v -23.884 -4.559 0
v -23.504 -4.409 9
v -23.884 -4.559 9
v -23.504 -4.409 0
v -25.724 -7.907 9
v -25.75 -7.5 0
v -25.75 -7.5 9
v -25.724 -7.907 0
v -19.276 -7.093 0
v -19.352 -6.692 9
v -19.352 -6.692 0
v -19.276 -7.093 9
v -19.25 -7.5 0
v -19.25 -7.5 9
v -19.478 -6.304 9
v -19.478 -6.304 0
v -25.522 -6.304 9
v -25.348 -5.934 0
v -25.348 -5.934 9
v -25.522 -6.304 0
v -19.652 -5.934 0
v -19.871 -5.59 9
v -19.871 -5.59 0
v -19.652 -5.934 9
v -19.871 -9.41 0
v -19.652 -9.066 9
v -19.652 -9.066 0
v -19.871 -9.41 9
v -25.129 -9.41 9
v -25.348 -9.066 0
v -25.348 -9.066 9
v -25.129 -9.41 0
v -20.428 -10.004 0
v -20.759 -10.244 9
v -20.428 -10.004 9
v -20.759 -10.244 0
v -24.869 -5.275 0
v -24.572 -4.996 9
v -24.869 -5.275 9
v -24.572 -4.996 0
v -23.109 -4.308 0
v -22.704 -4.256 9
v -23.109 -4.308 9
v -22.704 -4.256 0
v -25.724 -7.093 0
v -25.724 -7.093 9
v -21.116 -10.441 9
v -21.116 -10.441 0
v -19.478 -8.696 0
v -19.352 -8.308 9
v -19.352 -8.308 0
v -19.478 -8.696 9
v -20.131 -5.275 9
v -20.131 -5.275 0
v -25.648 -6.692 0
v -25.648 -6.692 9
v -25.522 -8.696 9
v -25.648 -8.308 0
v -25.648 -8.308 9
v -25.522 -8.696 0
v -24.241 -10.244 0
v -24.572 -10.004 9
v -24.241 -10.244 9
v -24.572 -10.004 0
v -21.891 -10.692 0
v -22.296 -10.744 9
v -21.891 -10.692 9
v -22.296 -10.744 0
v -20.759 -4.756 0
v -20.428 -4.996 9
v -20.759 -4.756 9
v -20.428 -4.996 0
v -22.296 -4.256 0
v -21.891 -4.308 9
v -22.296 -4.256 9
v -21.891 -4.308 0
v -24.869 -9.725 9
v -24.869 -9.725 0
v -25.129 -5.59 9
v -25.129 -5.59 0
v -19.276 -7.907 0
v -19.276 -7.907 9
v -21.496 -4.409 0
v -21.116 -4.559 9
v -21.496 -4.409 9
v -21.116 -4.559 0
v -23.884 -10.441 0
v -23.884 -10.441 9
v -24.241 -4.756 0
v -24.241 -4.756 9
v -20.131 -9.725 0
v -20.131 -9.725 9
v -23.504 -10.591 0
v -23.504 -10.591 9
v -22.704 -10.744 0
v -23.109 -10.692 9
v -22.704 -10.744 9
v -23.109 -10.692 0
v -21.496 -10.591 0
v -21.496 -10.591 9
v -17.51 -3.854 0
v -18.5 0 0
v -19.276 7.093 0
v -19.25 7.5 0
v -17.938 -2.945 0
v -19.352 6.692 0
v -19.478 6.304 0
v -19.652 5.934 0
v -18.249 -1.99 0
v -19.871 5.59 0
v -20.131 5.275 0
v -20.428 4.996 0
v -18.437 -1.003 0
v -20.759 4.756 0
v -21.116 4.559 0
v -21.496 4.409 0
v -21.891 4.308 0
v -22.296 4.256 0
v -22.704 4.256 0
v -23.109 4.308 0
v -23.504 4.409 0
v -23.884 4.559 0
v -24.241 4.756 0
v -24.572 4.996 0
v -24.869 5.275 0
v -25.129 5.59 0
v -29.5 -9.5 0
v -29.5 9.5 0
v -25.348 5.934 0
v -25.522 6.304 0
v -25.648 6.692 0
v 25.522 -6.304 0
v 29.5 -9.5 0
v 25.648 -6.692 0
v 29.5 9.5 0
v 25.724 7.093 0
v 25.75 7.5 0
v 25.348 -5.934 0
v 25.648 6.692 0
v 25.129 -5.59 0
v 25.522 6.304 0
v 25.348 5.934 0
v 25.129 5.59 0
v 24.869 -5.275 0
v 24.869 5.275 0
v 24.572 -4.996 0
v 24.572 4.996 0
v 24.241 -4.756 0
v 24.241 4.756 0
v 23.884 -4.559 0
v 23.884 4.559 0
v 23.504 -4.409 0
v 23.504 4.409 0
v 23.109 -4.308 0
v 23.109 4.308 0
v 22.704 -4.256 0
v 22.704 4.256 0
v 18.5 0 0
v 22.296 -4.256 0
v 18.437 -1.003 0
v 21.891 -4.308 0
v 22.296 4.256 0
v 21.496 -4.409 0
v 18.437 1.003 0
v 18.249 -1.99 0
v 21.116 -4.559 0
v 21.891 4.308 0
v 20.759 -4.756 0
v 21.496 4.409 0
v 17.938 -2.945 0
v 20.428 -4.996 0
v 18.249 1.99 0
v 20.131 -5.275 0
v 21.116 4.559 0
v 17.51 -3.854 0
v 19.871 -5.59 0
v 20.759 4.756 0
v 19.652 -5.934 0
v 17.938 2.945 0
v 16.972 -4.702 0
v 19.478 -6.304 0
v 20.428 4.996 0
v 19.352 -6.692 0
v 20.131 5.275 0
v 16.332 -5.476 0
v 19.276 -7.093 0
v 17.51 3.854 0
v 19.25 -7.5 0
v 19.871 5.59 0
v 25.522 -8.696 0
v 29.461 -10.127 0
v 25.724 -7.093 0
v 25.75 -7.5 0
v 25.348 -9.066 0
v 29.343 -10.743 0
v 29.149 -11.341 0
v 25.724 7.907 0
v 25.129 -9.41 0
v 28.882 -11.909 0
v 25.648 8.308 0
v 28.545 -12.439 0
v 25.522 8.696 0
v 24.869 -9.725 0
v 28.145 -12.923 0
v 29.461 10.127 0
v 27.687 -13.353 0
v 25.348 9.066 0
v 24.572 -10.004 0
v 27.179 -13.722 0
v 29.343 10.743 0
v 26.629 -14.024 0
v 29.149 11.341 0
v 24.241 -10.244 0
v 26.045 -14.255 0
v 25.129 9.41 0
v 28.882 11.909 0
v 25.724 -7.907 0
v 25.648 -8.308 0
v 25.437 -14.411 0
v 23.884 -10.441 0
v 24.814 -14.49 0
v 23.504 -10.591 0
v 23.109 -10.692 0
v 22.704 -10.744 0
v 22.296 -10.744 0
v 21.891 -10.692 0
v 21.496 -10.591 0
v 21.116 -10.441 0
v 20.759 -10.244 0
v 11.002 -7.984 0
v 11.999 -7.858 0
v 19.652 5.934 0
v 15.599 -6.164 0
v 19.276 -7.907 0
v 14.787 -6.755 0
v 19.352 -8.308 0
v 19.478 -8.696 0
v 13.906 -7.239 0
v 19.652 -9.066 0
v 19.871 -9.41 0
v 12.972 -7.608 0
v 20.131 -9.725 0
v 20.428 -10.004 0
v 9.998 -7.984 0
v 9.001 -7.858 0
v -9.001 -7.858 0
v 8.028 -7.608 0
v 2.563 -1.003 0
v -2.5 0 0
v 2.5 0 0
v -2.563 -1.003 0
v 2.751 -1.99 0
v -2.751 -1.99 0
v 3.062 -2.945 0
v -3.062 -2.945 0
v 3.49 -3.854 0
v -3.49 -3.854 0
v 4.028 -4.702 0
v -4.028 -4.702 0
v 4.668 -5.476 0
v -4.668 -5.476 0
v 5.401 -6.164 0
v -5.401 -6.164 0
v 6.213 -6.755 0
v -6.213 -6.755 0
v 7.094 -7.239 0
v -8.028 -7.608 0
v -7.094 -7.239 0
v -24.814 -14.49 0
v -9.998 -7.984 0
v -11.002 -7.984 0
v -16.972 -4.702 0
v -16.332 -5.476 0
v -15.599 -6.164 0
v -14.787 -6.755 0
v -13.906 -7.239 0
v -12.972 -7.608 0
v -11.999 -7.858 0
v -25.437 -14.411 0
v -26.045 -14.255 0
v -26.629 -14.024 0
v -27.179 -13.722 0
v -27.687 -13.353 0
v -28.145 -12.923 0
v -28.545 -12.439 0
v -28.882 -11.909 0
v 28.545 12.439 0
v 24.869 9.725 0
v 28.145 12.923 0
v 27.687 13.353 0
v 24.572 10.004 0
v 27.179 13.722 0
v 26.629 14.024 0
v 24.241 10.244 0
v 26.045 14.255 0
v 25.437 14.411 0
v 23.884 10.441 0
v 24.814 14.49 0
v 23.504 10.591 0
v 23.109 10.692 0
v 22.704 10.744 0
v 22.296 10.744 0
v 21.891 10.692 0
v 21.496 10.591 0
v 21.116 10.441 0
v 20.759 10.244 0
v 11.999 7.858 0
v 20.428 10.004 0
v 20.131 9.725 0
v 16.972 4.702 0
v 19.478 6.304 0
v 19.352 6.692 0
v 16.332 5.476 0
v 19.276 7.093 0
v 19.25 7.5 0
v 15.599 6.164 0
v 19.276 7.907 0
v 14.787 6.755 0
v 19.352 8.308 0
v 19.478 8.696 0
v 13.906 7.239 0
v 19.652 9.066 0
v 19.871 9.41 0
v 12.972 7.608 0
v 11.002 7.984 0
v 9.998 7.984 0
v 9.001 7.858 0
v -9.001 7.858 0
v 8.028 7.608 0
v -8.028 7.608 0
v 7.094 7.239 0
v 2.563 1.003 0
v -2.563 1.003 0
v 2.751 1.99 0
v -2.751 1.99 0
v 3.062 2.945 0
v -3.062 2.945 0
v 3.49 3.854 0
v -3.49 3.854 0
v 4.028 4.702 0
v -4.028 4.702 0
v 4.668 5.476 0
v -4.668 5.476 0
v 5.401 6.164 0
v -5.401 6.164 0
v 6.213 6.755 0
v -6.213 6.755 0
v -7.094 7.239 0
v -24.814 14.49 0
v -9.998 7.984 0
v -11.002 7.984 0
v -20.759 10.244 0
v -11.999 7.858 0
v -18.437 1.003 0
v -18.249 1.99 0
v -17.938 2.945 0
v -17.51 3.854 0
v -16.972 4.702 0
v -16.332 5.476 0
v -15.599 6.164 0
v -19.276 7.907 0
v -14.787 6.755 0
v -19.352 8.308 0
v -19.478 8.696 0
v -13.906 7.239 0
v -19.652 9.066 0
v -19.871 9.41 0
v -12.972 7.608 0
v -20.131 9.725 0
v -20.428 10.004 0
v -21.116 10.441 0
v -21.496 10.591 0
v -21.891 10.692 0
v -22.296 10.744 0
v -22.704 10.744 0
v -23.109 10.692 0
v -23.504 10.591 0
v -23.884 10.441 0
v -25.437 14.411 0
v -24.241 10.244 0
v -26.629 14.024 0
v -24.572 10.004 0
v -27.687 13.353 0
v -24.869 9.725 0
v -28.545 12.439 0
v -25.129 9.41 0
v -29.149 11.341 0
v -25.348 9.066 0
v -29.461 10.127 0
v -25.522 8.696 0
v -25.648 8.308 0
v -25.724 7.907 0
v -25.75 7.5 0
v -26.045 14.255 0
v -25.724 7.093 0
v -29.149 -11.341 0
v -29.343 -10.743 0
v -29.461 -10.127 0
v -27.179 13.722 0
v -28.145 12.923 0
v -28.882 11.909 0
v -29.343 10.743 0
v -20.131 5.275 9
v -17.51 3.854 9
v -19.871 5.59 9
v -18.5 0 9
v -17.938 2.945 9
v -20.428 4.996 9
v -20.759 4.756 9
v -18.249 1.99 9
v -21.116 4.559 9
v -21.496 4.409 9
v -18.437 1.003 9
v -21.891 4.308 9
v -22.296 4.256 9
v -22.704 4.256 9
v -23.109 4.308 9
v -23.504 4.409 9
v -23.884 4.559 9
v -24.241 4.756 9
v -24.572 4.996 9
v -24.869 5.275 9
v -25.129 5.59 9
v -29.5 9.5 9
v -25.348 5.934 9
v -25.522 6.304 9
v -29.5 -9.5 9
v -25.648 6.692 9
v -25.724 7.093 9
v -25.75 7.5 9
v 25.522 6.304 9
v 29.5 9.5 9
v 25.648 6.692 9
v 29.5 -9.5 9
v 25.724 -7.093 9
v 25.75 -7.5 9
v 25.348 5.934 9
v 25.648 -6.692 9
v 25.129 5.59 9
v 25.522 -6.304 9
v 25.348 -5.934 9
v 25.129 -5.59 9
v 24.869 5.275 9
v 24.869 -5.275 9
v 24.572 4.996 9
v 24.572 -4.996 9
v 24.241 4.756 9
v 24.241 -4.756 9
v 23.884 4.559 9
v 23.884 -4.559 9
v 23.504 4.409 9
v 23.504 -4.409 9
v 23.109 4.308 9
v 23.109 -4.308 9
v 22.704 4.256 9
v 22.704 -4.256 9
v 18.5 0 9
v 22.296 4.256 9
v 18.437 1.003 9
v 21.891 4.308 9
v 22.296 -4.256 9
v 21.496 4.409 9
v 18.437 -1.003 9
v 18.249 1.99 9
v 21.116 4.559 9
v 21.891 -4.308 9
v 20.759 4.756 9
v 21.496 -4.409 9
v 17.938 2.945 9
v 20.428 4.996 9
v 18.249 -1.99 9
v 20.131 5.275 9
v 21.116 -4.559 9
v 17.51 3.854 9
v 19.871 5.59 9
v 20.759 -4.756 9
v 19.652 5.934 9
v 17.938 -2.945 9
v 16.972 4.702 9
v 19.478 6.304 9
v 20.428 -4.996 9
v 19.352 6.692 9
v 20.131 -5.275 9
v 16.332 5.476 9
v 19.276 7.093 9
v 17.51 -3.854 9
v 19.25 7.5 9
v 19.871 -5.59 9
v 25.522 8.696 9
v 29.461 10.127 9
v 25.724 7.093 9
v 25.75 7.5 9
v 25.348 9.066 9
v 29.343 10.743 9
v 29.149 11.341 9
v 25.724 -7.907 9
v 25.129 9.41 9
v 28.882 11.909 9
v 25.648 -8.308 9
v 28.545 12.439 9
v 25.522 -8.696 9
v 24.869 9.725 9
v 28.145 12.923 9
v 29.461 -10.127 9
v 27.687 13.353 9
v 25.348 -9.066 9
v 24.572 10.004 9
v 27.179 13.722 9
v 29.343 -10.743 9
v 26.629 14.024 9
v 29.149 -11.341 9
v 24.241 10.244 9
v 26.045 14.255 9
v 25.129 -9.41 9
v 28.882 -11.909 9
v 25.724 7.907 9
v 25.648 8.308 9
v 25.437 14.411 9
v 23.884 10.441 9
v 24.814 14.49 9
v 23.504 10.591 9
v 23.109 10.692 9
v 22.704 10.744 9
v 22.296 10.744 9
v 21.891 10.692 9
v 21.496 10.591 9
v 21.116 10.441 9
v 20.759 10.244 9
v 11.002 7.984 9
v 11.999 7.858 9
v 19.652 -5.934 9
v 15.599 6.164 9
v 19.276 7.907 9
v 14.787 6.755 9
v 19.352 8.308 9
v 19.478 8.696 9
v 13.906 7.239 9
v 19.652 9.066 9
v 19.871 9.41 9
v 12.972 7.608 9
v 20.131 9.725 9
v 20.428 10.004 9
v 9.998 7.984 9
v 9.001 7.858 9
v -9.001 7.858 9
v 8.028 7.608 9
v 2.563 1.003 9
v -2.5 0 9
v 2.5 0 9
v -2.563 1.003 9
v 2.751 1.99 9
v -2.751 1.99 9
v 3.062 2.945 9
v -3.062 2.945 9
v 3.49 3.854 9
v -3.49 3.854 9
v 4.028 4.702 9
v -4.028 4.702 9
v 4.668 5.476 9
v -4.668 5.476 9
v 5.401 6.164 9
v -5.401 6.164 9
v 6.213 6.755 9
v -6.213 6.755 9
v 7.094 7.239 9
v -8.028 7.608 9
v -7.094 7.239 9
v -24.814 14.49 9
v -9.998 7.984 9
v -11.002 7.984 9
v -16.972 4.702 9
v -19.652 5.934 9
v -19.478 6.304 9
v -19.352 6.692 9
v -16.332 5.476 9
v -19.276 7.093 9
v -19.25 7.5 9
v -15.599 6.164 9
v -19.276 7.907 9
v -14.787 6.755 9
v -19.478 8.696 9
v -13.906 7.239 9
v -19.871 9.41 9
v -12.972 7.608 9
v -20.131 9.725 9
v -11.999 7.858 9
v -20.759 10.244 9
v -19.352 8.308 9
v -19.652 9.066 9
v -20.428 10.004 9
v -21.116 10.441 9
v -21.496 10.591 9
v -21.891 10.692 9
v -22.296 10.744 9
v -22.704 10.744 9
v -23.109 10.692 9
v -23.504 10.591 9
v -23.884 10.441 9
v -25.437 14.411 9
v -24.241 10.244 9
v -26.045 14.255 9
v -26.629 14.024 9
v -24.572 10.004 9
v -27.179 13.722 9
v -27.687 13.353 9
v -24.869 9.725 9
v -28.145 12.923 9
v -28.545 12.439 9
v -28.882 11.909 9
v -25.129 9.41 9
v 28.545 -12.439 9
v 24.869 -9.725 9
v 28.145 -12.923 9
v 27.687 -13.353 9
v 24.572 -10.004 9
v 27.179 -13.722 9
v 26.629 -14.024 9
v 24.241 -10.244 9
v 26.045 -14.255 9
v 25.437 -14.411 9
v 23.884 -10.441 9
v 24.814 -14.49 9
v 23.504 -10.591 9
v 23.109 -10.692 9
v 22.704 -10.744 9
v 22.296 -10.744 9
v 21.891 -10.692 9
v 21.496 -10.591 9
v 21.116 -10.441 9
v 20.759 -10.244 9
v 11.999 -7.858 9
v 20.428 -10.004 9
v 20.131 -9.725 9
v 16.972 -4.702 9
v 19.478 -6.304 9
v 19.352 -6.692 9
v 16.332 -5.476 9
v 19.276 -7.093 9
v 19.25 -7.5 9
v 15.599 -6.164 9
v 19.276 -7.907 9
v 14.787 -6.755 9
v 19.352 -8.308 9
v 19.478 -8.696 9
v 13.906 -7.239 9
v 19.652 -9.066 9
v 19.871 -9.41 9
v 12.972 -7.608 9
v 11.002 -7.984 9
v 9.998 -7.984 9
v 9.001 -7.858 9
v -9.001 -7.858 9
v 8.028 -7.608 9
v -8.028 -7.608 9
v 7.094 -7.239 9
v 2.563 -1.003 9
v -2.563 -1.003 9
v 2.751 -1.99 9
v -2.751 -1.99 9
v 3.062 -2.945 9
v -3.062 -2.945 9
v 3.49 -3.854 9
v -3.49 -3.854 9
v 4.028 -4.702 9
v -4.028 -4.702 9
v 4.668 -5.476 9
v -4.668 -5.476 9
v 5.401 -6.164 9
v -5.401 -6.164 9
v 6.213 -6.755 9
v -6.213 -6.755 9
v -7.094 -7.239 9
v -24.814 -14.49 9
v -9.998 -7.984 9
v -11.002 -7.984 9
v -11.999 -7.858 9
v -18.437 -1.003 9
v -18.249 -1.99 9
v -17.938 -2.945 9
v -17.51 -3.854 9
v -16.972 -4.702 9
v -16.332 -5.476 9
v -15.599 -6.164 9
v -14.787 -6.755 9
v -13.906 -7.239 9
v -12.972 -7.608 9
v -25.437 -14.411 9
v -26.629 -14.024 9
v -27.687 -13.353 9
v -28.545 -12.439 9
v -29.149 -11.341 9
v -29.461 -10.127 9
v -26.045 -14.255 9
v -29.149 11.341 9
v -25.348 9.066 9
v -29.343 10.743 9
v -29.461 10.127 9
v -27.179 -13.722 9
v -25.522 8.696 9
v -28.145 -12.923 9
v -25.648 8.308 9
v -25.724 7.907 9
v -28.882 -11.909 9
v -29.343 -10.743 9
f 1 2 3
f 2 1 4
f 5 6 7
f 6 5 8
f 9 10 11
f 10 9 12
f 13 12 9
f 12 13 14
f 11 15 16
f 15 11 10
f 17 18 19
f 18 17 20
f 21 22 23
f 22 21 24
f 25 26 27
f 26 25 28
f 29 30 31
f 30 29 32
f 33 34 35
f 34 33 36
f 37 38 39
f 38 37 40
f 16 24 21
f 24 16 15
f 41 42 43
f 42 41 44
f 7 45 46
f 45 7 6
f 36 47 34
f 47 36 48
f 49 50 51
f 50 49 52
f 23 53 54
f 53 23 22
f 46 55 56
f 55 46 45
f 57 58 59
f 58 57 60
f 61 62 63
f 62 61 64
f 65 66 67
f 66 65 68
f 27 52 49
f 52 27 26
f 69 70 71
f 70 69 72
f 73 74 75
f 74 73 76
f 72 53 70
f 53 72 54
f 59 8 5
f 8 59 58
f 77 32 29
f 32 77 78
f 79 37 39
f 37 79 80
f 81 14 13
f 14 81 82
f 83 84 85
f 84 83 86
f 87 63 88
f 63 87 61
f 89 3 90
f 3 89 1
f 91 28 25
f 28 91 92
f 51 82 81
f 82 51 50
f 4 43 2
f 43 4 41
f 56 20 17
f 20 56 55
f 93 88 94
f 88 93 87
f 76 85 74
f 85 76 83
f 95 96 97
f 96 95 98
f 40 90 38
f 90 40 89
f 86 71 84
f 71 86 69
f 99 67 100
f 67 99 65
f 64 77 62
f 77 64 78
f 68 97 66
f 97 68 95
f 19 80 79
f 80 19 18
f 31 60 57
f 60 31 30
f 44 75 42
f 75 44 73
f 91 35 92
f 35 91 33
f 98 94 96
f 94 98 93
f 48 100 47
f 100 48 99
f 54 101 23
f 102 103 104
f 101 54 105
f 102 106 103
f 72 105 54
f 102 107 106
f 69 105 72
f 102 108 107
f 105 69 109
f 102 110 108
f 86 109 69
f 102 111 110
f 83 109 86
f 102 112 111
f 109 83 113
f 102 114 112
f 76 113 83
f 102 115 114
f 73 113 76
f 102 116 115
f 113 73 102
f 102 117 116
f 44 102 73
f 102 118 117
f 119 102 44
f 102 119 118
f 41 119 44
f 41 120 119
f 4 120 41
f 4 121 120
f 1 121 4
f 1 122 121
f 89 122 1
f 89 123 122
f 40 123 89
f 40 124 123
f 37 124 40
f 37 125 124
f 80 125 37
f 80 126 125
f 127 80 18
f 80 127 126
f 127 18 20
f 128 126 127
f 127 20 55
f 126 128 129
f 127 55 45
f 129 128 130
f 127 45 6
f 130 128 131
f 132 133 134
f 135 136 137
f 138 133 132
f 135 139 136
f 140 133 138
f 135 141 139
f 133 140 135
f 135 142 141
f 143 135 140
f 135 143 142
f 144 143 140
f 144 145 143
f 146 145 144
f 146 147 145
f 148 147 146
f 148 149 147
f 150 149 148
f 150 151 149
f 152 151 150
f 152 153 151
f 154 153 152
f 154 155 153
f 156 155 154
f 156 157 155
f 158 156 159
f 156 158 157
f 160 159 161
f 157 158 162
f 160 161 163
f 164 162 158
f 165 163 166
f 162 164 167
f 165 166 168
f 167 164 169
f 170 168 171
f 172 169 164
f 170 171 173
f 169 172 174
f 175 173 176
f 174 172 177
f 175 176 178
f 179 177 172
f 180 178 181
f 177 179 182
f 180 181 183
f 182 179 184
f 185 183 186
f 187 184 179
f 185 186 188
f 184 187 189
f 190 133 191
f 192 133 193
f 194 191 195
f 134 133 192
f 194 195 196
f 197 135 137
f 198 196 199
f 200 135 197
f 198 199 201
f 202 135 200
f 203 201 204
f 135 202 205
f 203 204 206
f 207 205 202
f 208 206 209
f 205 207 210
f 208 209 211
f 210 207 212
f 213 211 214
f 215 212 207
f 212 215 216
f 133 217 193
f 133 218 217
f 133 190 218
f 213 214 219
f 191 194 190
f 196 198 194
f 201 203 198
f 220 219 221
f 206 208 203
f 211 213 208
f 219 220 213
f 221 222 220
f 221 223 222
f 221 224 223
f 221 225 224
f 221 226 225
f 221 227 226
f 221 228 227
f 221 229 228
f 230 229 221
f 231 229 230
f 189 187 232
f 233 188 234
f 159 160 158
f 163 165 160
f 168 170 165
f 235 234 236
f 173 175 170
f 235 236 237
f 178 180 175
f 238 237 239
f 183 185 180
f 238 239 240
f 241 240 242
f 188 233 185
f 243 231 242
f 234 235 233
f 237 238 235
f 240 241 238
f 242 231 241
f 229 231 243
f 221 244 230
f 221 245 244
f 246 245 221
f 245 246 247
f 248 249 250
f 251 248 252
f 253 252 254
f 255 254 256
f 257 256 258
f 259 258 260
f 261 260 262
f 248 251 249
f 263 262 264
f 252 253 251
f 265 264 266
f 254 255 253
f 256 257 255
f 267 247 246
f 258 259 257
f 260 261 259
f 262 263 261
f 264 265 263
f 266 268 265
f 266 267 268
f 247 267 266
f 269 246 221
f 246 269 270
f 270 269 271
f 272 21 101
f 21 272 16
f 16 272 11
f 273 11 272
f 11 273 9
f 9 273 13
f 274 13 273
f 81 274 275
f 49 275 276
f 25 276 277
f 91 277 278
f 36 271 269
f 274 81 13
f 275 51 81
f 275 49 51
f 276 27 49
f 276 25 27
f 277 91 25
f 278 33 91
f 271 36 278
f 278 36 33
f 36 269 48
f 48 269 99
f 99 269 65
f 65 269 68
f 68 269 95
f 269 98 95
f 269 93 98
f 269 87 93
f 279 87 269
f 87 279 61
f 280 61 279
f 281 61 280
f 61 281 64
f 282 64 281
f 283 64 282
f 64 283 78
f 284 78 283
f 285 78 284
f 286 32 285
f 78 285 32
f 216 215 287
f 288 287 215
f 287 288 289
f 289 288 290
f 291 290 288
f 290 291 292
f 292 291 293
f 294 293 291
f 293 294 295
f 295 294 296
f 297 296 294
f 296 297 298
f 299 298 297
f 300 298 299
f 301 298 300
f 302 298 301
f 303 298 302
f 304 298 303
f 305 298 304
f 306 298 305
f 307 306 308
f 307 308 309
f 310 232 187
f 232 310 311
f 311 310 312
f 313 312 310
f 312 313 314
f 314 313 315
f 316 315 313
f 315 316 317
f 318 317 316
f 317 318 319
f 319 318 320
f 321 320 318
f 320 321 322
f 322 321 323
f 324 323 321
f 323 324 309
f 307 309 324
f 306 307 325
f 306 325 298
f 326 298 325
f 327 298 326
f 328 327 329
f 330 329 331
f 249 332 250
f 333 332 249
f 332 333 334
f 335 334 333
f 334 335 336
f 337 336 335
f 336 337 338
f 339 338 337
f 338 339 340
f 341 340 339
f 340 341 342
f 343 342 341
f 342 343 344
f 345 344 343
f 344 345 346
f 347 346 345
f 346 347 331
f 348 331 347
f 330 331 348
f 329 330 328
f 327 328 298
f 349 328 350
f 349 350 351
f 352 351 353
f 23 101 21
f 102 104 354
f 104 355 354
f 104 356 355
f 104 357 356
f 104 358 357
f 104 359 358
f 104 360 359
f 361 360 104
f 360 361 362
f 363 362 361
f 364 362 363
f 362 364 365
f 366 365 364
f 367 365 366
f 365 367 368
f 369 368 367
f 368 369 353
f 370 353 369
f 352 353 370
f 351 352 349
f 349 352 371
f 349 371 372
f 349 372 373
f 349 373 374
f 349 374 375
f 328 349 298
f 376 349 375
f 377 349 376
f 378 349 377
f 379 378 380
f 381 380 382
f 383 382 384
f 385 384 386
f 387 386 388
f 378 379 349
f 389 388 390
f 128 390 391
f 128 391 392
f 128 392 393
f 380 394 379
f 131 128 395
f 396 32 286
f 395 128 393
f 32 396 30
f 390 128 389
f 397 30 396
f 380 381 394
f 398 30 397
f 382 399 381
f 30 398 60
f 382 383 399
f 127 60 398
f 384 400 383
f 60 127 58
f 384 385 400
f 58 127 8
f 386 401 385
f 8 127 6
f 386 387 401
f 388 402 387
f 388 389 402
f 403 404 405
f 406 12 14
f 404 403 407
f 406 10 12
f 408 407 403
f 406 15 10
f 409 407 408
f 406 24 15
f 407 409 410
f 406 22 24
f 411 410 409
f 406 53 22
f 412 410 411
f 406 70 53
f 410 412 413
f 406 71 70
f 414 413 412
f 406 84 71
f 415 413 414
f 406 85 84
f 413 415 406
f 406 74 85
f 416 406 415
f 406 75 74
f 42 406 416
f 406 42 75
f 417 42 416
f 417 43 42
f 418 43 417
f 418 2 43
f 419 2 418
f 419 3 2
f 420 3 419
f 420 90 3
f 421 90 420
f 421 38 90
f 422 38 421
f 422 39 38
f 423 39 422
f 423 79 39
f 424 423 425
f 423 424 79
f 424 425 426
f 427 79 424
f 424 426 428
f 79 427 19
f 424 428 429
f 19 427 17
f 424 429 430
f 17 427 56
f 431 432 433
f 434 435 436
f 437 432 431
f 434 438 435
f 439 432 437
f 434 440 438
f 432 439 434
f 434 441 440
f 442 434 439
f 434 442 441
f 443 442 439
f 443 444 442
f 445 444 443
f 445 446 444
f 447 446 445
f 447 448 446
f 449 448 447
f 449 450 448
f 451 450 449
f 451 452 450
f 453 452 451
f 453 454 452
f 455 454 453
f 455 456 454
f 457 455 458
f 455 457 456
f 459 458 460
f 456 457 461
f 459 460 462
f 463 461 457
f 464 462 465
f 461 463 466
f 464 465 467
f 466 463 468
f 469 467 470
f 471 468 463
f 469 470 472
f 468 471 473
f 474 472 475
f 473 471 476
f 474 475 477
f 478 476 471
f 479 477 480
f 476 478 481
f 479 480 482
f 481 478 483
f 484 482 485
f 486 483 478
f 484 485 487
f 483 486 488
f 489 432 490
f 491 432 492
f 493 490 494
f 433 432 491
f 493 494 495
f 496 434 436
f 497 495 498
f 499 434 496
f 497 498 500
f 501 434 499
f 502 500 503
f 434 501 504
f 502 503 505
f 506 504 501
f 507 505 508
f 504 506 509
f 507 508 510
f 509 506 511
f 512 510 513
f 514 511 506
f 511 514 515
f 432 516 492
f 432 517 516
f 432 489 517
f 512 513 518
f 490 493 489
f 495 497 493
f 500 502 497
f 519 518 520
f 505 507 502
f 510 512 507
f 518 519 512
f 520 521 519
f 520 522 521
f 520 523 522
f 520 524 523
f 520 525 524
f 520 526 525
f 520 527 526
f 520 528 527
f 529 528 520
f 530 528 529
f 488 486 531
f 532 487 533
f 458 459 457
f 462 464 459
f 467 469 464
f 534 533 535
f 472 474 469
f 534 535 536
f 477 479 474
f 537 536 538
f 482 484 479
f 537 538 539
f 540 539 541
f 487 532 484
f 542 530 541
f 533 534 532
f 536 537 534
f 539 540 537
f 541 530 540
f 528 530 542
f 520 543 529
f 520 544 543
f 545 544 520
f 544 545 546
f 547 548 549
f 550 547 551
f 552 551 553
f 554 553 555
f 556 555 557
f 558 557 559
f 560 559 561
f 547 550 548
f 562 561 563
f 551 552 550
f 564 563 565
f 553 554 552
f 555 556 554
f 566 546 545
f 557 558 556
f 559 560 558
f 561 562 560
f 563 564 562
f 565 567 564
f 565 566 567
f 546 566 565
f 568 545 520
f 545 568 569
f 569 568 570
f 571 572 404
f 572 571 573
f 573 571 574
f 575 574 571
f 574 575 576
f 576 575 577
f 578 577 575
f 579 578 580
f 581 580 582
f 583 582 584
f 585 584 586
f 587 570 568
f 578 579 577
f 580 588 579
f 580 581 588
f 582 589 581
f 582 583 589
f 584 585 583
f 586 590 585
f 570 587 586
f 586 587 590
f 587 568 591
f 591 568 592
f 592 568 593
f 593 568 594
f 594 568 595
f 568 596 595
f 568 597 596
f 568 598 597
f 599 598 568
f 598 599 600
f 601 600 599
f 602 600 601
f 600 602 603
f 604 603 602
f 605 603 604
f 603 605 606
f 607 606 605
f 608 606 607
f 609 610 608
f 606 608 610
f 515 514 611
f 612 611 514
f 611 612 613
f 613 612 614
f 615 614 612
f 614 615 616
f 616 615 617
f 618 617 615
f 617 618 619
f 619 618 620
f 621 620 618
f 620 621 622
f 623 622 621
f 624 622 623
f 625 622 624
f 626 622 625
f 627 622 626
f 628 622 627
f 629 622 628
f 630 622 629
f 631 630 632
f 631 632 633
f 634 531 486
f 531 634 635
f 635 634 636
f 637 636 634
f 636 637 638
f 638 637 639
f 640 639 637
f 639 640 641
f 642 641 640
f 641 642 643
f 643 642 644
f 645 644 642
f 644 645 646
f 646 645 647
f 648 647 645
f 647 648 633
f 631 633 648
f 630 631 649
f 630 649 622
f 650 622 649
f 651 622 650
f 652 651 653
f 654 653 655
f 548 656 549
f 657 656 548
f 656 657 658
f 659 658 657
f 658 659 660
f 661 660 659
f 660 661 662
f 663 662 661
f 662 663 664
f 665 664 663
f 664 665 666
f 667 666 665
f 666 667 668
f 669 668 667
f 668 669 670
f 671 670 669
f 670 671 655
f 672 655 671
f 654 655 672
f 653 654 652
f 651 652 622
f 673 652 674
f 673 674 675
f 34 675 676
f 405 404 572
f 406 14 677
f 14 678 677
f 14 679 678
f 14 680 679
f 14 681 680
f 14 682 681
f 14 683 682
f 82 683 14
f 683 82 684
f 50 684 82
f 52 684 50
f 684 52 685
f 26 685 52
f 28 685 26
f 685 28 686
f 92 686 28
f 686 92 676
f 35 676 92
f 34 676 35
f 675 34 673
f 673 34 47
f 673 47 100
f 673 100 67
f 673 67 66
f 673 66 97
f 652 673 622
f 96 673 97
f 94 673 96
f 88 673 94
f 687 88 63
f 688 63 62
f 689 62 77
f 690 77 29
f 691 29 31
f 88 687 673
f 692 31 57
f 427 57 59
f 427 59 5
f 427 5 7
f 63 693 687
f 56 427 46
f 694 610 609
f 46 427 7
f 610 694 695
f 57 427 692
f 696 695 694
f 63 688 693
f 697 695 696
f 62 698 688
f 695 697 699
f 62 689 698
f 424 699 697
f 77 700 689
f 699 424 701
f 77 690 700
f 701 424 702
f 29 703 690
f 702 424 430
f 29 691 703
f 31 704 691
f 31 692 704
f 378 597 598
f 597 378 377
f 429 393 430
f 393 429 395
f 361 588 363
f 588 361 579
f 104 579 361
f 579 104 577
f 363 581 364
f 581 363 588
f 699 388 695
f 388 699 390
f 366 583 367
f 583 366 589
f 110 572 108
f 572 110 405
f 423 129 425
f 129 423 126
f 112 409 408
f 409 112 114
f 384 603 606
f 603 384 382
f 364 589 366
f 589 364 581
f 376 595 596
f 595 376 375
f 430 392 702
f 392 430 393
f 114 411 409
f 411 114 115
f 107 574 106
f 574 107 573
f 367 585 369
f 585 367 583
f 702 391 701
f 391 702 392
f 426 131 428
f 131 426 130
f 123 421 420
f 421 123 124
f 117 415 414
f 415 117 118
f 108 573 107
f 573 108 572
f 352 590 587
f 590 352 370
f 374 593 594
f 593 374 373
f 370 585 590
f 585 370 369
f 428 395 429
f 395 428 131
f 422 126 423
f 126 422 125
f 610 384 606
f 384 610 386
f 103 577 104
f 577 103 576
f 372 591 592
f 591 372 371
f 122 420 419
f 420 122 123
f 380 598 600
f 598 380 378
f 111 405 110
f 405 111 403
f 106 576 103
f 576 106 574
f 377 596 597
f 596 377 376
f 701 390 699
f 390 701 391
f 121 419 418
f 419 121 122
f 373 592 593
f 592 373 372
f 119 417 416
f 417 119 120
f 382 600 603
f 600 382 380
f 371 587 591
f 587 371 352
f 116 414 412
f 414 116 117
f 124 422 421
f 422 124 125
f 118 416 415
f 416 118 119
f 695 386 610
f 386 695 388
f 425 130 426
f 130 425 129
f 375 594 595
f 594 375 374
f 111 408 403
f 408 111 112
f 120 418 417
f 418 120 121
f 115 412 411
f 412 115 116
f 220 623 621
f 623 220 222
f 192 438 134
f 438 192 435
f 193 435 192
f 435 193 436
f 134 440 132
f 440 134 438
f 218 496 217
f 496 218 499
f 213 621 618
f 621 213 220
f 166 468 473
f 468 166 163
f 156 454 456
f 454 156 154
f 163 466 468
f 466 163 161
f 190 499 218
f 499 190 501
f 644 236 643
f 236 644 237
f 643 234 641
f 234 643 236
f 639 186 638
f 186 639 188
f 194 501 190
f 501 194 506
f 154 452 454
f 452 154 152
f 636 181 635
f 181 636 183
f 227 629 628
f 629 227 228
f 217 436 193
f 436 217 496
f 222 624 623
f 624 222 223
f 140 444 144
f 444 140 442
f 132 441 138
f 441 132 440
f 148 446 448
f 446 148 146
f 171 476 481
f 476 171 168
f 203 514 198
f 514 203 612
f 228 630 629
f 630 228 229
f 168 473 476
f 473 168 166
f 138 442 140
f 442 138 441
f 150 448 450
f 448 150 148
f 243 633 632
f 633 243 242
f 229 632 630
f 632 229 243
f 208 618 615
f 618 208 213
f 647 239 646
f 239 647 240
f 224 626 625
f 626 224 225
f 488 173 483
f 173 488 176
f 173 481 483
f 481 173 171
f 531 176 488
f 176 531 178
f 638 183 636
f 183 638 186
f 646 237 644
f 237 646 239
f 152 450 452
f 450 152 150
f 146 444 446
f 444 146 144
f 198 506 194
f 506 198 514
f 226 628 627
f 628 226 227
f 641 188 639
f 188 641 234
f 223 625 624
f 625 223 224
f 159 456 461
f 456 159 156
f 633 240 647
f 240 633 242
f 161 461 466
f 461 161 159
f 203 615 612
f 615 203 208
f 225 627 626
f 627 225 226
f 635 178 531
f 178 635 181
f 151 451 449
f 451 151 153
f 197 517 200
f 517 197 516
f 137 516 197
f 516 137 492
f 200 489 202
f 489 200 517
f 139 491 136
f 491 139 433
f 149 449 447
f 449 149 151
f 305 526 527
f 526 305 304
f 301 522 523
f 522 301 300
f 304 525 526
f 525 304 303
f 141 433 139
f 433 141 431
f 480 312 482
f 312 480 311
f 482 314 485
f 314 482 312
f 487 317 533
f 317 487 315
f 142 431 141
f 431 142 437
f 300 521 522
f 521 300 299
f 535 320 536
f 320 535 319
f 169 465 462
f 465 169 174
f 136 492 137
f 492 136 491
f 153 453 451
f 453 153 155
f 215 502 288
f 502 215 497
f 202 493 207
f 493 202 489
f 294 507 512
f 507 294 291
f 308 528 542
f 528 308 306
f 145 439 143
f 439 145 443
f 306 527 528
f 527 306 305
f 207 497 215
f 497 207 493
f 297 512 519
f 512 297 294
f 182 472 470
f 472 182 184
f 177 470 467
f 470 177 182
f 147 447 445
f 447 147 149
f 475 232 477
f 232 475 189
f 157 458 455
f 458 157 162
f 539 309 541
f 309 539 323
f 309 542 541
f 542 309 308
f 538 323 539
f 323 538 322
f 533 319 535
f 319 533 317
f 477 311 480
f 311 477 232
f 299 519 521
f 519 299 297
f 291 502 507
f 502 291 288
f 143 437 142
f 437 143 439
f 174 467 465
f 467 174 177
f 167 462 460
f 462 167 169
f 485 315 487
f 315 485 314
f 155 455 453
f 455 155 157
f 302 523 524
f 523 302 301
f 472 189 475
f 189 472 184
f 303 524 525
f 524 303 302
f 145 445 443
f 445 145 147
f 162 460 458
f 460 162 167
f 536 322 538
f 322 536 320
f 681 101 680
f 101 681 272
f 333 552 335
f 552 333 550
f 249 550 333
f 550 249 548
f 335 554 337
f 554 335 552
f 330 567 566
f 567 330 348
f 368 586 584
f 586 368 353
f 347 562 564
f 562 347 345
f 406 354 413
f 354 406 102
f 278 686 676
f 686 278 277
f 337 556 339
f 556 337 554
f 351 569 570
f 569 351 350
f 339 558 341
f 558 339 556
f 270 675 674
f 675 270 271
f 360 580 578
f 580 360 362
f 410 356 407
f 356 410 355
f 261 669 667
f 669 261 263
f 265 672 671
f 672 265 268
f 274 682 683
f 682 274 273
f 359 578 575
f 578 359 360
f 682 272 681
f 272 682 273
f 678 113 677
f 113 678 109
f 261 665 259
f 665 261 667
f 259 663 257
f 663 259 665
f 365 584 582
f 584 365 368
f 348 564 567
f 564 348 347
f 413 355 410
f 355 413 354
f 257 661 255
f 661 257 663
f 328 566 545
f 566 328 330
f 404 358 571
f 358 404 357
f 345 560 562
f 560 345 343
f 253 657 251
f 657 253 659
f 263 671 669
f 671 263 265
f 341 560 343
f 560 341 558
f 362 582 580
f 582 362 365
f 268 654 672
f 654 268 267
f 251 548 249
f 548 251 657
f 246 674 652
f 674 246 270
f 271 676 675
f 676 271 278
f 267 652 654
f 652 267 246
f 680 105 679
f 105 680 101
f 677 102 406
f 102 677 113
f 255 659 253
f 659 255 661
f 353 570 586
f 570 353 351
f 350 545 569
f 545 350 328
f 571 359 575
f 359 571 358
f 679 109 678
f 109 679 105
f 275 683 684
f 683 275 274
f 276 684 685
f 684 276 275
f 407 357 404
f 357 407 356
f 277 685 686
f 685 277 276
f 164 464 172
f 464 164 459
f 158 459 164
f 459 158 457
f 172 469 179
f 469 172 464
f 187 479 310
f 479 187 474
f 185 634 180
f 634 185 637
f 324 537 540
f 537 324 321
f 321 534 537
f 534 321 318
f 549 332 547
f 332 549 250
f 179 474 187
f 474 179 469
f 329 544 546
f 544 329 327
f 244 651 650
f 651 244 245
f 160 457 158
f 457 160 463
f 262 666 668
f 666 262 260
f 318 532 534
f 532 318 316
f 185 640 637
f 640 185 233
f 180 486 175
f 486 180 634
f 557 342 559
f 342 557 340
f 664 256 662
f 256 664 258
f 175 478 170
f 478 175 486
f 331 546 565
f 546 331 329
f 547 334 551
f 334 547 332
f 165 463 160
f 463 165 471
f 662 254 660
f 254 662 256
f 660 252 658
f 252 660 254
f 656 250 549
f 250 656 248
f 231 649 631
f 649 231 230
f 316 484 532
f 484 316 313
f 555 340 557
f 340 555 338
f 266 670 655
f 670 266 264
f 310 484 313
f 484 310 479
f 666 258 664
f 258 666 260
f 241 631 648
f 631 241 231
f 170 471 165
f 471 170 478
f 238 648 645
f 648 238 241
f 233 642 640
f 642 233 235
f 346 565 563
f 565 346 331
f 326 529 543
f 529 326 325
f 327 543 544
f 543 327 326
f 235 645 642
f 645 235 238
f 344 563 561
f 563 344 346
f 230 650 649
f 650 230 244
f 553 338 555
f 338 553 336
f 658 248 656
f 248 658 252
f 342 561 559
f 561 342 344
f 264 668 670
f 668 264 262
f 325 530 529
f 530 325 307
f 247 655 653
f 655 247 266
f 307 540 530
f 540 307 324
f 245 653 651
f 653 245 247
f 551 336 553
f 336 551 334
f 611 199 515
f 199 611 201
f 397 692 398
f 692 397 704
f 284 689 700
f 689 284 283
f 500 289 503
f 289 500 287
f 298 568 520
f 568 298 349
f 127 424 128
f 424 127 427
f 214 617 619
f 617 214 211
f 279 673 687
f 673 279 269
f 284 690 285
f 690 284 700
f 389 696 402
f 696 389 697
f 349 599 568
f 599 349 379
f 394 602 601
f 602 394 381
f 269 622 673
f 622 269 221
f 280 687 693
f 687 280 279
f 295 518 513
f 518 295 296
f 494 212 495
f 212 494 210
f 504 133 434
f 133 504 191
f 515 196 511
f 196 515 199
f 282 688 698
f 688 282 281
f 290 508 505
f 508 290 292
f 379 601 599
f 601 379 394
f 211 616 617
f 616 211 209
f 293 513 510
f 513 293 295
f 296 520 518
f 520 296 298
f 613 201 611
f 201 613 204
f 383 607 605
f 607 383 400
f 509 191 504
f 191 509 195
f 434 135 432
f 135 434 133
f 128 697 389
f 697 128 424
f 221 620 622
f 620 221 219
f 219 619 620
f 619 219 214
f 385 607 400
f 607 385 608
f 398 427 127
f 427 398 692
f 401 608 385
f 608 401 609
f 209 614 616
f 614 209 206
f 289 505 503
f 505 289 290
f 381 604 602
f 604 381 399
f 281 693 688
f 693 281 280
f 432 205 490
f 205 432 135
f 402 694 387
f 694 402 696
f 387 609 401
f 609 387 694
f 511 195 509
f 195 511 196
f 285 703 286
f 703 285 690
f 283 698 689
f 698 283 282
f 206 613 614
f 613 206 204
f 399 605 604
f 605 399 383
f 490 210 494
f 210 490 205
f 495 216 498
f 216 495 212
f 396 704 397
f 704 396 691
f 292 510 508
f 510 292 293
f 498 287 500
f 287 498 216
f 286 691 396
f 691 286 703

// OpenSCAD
$fn = 50;

difference() {
	union() {
		hull() {
			translate(v = [-24.5, 9.5, 0]) {
				cylinder(h = 9, r = 5);
			}
			translate(v = [24.5, 9.5, 0]) {
				cylinder(h = 9, r = 5);
			}
			translate(v = [-24.5, -9.5, 0]) {
				cylinder(h = 9, r = 5);
			}
			translate(v = [24.5, -9.5, 0]) {
				cylinder(h = 9, r = 5);
			}
		}
	}
	union() {
		translate(v = [-22.5, -7.5, 0]) {
			cylinder(h = 9, r = 3.25);
		}
		translate(v = [-22.5, 7.5, 0]) {
			cylinder(h = 9, r = 3.25);
		}
		translate(v = [22.5, -7.5, 0]) {
			cylinder(h = 9, r = 3.25);
		}
		translate(v = [22.5, 7.5, 0]) {
			cylinder(h = 9, r = 3.25);
		}
		translate(v = [-10.5, 0, 0.0]) {
			cylinder(h = 9, r = 8.0);
		}
		translate(v = [10.5, 0, 0.0]) {
			cylinder(h = 9, r = 8.0);
		}
	}
}
